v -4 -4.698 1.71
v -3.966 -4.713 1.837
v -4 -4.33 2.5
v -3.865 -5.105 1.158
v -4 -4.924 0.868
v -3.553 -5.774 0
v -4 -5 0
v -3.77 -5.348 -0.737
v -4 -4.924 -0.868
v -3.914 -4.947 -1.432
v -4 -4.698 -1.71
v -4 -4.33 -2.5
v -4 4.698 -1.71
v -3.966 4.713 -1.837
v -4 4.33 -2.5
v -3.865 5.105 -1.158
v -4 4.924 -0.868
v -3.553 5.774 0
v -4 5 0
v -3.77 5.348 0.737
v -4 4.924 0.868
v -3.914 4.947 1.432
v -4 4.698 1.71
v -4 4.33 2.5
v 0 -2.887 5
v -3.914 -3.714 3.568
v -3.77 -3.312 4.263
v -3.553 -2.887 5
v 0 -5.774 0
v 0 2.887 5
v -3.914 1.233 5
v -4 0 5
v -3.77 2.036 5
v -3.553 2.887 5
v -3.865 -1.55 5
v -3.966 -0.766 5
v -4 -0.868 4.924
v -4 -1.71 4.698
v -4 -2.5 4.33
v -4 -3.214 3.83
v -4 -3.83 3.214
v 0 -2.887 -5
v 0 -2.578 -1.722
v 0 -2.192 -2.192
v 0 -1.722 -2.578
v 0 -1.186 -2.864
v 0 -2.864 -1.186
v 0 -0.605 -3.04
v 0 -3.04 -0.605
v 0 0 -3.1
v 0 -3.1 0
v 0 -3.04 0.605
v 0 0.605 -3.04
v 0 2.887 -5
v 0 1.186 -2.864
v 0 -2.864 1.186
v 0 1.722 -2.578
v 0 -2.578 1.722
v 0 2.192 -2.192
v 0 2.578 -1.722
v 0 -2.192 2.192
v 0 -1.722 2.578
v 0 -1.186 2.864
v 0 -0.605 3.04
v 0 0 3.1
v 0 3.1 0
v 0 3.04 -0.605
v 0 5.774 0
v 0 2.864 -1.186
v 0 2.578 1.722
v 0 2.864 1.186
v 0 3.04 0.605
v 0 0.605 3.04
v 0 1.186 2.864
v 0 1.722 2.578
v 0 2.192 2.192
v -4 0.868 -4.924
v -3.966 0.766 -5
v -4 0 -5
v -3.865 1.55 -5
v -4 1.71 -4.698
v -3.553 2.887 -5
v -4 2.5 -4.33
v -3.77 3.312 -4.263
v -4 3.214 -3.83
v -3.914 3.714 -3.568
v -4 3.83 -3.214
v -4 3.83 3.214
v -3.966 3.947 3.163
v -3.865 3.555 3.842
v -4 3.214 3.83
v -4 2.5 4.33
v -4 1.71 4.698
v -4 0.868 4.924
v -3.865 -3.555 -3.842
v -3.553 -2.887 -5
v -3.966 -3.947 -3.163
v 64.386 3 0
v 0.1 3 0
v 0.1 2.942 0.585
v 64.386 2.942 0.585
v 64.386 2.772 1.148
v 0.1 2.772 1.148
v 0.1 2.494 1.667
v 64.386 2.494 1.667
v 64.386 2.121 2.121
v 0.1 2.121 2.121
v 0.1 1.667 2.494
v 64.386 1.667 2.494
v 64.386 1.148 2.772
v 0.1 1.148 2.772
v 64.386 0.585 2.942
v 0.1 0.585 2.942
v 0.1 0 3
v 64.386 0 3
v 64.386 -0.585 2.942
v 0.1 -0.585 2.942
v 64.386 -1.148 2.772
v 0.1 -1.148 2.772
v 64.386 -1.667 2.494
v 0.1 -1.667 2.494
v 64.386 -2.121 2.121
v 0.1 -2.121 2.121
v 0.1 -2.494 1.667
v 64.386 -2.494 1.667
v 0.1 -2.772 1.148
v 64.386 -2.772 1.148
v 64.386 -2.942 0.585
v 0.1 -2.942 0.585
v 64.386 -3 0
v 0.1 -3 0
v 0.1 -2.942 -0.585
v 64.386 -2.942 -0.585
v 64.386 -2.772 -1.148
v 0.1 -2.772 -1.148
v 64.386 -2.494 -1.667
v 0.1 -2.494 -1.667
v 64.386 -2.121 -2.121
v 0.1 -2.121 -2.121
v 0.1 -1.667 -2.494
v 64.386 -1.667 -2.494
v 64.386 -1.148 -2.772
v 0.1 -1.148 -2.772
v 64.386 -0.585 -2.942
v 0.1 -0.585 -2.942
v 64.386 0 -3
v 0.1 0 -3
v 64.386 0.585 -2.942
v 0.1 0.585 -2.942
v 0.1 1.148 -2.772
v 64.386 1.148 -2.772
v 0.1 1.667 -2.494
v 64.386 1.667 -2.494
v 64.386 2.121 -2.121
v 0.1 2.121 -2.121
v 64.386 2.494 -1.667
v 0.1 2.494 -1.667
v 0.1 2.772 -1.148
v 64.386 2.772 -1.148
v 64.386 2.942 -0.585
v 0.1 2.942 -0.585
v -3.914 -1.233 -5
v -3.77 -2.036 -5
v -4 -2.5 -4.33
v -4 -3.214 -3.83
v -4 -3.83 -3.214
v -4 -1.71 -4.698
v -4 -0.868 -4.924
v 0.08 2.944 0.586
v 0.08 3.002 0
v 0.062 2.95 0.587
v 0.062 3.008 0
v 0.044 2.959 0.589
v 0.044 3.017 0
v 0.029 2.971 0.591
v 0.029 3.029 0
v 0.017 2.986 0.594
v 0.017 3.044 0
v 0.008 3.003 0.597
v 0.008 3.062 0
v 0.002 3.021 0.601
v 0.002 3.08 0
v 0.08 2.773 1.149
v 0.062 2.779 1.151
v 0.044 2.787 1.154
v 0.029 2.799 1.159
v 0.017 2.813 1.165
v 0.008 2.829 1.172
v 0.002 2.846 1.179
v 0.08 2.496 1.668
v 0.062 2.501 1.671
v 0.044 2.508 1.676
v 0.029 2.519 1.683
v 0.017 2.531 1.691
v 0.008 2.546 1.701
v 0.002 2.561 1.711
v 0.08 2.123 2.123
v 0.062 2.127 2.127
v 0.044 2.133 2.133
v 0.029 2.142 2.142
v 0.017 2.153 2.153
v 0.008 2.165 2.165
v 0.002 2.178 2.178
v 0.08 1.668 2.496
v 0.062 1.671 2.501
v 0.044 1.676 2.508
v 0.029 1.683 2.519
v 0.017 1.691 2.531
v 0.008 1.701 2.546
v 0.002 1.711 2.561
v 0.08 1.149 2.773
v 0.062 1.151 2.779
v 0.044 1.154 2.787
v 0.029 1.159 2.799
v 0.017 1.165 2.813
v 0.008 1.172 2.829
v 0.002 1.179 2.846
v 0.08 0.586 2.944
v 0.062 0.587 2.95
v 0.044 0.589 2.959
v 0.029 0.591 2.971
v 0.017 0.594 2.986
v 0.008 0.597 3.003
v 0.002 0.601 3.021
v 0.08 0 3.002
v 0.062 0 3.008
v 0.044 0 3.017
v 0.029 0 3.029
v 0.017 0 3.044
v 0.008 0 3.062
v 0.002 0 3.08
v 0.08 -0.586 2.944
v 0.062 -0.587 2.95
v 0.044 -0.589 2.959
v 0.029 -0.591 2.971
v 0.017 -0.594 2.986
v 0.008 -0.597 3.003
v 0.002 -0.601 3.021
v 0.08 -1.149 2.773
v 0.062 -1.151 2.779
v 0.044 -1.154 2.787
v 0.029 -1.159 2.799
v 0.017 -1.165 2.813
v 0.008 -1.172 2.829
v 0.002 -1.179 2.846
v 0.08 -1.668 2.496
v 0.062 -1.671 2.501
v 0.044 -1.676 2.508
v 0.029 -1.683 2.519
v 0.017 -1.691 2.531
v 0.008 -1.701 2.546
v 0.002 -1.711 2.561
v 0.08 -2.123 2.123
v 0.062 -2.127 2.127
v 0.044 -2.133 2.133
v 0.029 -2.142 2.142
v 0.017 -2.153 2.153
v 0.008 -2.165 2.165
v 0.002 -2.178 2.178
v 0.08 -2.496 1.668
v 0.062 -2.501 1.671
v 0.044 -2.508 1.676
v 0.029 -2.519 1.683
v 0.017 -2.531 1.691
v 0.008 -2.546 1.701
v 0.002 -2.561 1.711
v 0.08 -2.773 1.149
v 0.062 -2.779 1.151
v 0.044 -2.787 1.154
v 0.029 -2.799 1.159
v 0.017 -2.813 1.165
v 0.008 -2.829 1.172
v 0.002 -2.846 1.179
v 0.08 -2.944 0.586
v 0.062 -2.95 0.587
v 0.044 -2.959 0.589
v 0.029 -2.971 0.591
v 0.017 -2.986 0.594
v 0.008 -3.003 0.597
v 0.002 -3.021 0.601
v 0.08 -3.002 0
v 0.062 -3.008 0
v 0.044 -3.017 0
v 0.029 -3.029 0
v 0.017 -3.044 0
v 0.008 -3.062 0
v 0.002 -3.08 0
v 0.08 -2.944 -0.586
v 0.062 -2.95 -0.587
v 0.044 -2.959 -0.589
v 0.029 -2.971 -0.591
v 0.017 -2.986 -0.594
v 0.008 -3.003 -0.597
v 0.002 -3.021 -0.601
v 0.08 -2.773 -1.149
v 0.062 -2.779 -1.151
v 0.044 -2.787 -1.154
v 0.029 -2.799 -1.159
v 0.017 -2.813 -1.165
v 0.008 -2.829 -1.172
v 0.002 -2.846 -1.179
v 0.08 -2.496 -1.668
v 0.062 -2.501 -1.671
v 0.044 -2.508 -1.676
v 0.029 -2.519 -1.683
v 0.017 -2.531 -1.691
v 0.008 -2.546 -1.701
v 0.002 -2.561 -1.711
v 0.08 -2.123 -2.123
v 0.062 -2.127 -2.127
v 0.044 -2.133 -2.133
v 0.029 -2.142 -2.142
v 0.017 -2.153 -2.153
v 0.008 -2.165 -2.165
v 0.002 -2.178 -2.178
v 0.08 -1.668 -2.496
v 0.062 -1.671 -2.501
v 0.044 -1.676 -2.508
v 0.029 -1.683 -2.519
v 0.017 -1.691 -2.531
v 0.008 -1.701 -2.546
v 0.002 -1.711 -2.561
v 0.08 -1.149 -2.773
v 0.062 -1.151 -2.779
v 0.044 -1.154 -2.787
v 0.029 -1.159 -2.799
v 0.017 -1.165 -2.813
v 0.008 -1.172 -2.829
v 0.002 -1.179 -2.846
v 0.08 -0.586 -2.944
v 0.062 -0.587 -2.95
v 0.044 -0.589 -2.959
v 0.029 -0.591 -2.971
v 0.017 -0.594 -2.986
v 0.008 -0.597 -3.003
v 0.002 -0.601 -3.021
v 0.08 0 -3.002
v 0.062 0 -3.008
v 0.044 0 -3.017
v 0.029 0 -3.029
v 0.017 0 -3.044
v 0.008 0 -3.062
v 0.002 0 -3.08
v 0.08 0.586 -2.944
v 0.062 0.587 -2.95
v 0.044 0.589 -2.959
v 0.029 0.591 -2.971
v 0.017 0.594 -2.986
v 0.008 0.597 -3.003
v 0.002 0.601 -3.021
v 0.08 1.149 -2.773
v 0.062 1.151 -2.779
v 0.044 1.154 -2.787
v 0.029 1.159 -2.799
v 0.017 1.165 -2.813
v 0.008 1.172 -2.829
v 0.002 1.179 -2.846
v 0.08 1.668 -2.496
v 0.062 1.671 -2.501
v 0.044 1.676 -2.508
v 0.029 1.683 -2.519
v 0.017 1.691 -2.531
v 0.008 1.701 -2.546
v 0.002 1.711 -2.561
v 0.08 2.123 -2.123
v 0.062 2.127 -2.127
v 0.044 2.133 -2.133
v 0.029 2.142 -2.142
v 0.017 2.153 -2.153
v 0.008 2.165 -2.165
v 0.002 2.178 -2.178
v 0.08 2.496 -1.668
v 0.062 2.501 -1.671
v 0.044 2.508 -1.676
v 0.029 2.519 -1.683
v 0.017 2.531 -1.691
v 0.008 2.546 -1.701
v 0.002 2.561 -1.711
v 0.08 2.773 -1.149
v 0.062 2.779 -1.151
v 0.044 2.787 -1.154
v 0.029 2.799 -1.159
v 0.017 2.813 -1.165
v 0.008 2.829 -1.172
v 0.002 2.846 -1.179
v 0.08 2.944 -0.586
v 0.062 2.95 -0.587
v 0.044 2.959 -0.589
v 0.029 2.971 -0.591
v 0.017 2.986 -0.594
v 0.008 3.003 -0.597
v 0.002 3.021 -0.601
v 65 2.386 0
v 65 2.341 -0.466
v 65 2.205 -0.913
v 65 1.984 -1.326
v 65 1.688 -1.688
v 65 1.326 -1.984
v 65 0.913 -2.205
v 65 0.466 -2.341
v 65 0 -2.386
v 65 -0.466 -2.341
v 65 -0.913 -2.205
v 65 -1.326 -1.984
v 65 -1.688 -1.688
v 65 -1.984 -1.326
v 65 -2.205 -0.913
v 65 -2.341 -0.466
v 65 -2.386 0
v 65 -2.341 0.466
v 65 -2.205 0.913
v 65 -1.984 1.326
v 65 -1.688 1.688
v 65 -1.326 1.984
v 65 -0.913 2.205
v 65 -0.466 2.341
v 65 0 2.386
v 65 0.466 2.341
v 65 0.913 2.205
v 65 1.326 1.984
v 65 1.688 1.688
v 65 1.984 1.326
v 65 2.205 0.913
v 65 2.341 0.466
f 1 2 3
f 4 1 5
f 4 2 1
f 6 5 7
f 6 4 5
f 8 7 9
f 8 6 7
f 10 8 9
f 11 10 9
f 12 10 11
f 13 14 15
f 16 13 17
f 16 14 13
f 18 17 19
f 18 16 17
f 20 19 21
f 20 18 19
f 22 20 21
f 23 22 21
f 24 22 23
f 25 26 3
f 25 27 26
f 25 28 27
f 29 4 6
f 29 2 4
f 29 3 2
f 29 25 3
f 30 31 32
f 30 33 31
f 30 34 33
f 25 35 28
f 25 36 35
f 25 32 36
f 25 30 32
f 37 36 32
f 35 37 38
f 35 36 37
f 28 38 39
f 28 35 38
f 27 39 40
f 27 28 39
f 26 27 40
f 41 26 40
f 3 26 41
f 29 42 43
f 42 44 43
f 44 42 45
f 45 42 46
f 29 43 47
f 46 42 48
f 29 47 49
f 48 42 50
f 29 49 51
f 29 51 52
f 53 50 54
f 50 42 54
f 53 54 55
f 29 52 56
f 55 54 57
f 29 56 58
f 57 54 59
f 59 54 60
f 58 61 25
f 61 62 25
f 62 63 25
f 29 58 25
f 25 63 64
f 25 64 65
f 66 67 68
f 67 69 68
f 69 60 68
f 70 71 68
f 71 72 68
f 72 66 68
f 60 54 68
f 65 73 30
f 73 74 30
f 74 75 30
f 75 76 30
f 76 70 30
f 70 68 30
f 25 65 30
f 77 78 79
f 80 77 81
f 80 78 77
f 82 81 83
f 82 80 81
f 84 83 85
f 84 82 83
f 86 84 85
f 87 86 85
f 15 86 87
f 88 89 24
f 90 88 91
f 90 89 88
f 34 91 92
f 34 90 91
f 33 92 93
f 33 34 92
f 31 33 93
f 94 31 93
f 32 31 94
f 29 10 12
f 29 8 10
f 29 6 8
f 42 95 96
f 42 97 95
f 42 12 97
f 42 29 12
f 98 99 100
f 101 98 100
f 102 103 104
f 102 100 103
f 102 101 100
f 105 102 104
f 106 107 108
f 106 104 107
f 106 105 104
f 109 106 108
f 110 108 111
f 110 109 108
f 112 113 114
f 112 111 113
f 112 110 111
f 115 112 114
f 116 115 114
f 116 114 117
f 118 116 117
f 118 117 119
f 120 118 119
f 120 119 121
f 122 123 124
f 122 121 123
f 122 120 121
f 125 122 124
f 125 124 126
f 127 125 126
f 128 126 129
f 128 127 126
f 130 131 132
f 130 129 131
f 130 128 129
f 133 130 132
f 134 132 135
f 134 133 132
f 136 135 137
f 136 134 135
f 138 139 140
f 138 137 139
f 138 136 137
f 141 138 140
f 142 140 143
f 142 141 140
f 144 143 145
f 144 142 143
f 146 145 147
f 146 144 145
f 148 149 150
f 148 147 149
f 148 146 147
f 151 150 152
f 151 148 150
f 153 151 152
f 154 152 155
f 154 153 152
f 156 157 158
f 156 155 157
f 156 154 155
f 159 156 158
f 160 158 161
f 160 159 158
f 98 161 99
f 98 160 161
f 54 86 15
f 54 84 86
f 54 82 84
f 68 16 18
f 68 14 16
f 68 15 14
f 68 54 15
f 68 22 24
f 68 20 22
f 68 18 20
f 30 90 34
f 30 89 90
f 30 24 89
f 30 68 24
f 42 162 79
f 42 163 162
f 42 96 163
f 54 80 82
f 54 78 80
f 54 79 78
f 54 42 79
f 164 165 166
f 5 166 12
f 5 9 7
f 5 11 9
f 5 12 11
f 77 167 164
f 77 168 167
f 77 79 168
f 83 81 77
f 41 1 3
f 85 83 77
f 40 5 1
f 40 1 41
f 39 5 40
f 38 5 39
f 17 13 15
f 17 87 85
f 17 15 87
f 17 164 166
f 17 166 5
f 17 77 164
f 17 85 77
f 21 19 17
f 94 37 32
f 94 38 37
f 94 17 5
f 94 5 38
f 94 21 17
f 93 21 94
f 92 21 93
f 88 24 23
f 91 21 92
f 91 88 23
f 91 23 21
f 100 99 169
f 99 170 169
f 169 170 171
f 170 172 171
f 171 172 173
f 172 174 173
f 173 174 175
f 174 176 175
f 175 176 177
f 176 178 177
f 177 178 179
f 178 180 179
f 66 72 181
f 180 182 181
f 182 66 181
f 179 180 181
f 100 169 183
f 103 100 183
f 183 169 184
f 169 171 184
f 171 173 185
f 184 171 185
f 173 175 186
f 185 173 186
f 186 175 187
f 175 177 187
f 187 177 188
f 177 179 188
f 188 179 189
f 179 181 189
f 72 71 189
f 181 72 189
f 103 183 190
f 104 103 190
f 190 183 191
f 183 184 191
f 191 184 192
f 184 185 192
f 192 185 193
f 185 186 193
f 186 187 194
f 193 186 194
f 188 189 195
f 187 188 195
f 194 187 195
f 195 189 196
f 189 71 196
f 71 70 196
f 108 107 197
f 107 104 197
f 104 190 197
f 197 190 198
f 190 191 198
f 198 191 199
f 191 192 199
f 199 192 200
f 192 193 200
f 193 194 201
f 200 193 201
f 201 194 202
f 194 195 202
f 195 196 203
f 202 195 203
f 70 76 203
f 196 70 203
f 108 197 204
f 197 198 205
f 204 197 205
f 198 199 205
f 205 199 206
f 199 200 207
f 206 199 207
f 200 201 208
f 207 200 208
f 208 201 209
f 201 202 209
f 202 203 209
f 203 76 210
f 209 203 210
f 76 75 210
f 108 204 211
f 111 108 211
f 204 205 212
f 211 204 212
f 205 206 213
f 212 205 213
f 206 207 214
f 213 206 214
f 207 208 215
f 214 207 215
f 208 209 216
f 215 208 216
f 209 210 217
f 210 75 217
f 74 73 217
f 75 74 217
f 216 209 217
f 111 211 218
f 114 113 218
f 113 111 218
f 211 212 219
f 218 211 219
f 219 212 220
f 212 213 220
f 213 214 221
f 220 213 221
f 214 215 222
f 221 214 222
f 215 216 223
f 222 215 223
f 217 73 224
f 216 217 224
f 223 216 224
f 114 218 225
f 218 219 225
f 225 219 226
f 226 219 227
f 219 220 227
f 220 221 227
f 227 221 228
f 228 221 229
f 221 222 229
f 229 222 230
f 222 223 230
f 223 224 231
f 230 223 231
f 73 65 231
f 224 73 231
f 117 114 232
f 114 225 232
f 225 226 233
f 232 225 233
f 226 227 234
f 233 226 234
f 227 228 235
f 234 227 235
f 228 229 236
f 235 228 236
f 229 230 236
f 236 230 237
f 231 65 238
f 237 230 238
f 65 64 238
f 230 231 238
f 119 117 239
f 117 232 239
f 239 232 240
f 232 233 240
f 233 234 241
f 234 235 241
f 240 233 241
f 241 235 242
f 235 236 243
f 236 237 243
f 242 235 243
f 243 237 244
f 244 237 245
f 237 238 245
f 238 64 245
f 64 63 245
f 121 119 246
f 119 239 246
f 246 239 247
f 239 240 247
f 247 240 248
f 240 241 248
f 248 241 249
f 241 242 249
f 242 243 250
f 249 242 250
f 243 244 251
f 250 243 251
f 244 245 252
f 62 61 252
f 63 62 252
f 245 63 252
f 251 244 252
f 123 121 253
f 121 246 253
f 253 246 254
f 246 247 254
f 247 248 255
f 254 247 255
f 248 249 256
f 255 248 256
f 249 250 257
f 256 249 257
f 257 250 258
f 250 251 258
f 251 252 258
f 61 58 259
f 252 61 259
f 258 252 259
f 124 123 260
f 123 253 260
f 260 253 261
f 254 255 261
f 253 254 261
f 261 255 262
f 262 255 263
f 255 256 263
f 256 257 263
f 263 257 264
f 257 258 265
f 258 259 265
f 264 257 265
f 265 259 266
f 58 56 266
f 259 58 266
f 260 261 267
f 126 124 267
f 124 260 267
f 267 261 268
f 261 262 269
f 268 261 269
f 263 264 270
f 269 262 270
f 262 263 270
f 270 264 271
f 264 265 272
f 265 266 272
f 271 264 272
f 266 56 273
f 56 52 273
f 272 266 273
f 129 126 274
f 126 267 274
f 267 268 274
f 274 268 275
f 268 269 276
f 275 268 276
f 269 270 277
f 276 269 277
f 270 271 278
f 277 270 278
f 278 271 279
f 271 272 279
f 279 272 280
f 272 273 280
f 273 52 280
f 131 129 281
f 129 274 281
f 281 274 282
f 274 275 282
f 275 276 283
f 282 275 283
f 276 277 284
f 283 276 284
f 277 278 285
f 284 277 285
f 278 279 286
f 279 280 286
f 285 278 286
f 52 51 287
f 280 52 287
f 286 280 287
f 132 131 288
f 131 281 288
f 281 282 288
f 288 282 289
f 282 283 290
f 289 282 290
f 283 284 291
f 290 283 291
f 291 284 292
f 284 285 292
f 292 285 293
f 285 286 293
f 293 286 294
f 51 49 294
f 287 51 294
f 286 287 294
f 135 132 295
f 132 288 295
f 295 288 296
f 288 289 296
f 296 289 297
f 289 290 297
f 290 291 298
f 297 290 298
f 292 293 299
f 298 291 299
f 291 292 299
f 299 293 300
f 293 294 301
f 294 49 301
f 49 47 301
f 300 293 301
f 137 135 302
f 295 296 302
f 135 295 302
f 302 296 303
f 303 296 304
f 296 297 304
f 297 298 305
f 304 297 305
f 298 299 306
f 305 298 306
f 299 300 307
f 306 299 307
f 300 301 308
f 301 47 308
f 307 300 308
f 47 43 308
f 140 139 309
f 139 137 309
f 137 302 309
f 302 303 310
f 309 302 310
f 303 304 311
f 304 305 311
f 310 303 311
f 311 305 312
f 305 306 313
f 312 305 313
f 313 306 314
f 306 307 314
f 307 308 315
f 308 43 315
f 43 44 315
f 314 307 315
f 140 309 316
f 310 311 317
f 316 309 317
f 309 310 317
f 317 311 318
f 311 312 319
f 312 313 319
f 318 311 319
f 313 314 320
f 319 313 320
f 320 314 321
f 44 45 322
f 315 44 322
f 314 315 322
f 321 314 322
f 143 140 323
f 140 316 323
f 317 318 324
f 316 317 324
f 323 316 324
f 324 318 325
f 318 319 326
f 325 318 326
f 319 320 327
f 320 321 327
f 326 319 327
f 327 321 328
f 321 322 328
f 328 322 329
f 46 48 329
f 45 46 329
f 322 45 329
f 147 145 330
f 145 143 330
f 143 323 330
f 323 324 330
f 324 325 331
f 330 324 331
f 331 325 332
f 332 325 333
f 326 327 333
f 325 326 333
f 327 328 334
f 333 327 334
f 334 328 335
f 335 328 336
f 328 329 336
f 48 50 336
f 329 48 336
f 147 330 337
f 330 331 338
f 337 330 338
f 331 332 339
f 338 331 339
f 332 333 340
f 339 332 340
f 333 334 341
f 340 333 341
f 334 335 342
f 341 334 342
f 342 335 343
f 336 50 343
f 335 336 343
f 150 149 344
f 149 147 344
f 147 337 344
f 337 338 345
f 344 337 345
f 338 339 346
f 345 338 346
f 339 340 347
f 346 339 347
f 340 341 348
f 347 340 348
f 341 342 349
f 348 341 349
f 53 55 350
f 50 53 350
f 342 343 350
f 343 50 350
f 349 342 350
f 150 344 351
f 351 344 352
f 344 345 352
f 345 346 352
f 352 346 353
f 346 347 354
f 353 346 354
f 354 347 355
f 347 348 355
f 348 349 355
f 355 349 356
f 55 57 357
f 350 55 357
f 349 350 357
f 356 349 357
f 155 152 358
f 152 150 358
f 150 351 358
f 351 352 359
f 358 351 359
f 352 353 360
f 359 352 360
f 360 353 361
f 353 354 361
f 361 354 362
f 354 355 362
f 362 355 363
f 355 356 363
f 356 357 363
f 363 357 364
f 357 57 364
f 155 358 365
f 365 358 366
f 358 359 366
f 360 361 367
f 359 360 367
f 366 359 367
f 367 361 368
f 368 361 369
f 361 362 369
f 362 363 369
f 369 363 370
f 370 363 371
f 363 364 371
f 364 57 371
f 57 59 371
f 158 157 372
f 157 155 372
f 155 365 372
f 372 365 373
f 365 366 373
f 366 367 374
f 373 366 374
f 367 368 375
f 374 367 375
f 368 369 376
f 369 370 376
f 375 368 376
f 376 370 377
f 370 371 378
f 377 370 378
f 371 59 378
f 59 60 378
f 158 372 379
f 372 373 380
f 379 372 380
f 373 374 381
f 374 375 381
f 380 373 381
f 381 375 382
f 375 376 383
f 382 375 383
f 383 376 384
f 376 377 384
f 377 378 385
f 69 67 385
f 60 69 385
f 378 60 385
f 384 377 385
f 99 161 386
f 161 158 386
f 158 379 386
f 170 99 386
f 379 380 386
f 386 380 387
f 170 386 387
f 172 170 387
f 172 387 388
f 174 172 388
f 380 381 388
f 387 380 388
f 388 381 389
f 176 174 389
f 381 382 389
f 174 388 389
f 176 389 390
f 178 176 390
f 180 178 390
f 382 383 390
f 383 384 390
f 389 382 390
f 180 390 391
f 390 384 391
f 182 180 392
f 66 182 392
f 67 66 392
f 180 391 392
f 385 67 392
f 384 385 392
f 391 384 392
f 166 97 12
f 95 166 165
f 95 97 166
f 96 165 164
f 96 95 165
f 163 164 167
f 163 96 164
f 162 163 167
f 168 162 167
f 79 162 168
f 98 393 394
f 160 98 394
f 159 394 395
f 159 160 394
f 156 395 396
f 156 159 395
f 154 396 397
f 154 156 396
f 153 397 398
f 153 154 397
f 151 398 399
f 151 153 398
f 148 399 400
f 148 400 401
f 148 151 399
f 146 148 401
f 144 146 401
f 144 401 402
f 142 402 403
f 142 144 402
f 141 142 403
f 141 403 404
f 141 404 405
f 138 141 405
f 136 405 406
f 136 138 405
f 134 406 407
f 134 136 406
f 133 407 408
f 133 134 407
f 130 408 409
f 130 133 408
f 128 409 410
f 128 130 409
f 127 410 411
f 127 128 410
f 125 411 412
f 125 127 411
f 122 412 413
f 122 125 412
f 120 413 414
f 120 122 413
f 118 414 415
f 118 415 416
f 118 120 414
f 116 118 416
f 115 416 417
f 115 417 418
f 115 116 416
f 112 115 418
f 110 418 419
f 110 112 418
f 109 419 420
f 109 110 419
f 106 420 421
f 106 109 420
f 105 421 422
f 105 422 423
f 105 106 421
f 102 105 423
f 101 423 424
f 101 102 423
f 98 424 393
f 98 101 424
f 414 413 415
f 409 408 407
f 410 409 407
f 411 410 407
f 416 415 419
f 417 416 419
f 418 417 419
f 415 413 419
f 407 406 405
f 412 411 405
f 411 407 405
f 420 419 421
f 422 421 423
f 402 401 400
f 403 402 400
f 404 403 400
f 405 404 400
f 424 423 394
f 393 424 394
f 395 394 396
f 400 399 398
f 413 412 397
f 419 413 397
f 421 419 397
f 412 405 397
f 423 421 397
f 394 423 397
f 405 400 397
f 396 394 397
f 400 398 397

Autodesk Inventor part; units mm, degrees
ref_plane "YZ Plane" through (0, 0, 0) normal (1, 0, 0) x (0, 1, 0)
ref_plane "XZ Plane" through (0, 0, 0) normal (0, 1, 0) x (-1, 0, 0)
sketch "Эскиз1" plane through (0, 0, 0) normal (0, 0, 1) x (1, 0, 0)
  line L0 (0, 3) -> (65, 3)
  line L1 (65, 3) -> (65, 0)
  line L2 (65, 0) -> (0, 0)
  line L3 (-13, 0) -> (78, 0) projected
  line L4 (0, -0.6) -> (0, 3.6) projected
  line L5 (0, 3) -> (0, 0)
  dimension "d2" = 6
  dimension "d59" = 65
revolve "Базовый элемент" add sketch "Эскиз1" angle 360 about axis through (65, 0, 0) along (-1, 0, 0)
sketch "Эскиз2" plane through (0, 0, 0) normal (-1, 0, 0) x (0, 0, 1)
  line L0 (0, 5.7735) -> (5, 2.8868)
  line L1 (5, 2.8868) -> (5, -2.8868)
  line L2 (5, -2.8868) -> (0, -5.7735)
  line L3 (0, -5.7735) -> (-5, -2.8868)
  line L4 (-5, -2.8868) -> (-5, 2.8868)
  line L5 (-5, 2.8868) -> (0, 5.7735)
  line L6 (-7, 0) -> (7, 0) projected
  line L7 (0, 8.0829) -> (0, -8.0829) projected
  point P0 (0, 0)
  point P1 (0, 0)
  dimension "d11" = 10
extrude "С головкой" add sketch "Эскиз2" along normal blind 4
sketch "Эскиз4" plane through (0, 0, 0) normal (0, 0, 1) x (1, 0, 0)
  line L0 (-3.4226, 6) -> (-4, 5)
  line L1 (-1.1, 0) -> (-0.234, 0)
  line L2 (-4.7532, 0) -> (0.5192, 0) projected
  line L3 (-4, 6) -> (-3.4226, 6)
  line L4 (-4, 5) -> (-4, 6)
  line L5 (0, 7.2) -> (0, -1.2) projected
  dimension "d65" = 10
  dimension "d67" = 30
  dimension "d68" = 12
  dimension "d69" = 4
revolve "Фаска1" cut sketch "Эскиз4" angle 360 about axis through (-1.1, 0, 0) along (1, 0, 0)
thread "Резьба" size "M6x1" class "6g" standard "ISO Metric profile" length 18
chamfer "Фаска2" distance 0.6135 distance2 0.6136 1 edges at (65, -3, 0) measured on face at (65, -0.7485, 0.6631)
fillet "Fillet2" radius 0.1 1 edges at (0, -3, 0)
ref_plane "Work Plane1" through (1.525, 0, 0) normal (0, 0, 1) x (1, 0, 0)
equation "\"d71\" = RR"
equation "\"d11\" = SW"
equation "\"d3\" = KOH"
equation "\"d15\" = GEL"
equation "\"d6\" = -0.5 * SPD + 0.5 * GD"
equation "\"d2\" = GD"
equation "\"d59\" = NLG"
equation "\"d65\" = SW"
equation "\"d67\" = ANG1"
equation "\"d68\" = 1.2 * SW"
equation "\"d69\" = KOH"
equation "\"NLG\" = 65"
equation "\"GD\" = 6"
equation "\"BDM\" = 6"
equation "\"KOH\" = 4"
equation "\"GEL\" = 18"
equation "\"SW\" = 10"
equation "\"SW0\" = 9"
equation "\"SPD\" = NND - 1.2269 * PTC"
equation "\"SD2\" = 6"
equation "\"SD\" = 0"
equation "\"ANG1\" = 30deg"
equation "\"GAL\" = 0.61345 * PTC"
equation "\"GUL\" = 0.61345 * PTC"
equation "\"RR\" = 0.1"
equation "\"RR1\" = 0.1"
equation "\"GD1\" = THREADDIA - 1.2269 * PTC"
equation "\"THREADDIA\" = 6"
equation "\"TOA\" = 30deg"
equation "\"PTC\" = 1"
equation "\"NND\" = 6"
equation "\"E0\" = 1.155 * SW"
properties part number "Болт M6-6gx65 ГОСТ 7798-70" material "Сталь, мягкая"
